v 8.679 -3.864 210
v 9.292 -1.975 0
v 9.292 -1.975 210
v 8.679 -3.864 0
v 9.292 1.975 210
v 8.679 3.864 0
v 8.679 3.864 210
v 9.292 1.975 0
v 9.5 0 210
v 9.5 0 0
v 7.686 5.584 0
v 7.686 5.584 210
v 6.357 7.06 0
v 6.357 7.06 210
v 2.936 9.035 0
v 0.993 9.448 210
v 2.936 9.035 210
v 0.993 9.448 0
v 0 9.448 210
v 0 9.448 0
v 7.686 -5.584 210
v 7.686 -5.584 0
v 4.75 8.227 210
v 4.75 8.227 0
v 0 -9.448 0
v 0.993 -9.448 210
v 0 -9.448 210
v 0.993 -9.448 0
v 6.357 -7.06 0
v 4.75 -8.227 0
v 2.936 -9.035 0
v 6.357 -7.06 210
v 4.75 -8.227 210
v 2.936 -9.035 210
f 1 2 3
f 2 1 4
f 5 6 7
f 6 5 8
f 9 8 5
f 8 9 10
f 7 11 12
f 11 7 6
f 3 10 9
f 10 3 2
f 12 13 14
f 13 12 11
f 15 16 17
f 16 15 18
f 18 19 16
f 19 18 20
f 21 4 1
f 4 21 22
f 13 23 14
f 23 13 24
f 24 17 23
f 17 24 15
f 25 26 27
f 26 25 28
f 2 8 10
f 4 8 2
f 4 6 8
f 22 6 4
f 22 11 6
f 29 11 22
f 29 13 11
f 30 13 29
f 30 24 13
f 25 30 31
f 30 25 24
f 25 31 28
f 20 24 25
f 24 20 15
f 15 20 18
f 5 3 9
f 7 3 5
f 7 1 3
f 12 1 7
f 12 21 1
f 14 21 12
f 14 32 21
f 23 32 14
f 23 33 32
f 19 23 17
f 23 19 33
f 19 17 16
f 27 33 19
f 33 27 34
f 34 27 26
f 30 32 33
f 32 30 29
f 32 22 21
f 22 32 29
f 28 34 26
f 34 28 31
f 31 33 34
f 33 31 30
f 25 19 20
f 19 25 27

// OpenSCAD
length = 180 * 10;
stlLength = 149;
scaleM = length / stlLength;

// needleBit(0);
connector();

module connector() {
  intersection() {
    cylinder(r=9.5,h=210);
    translate([0,-50,0]) cube([100,100,2000]);
  }
}

module needleBit(section) {
  sectionSize=380;
  //sectionSize=38000;

  rotate([0,0,45]) intersection() {
    difference() {
      scale(scaleM) import("hornet_needle.stl");
      translate([0,180,0]) rotate([-90,0,0]) cylinder(r=10,h=1530);
    }
    translate([-500,section*sectionSize,0]) cube([1000,sectionSize,100]); 
  }
}
